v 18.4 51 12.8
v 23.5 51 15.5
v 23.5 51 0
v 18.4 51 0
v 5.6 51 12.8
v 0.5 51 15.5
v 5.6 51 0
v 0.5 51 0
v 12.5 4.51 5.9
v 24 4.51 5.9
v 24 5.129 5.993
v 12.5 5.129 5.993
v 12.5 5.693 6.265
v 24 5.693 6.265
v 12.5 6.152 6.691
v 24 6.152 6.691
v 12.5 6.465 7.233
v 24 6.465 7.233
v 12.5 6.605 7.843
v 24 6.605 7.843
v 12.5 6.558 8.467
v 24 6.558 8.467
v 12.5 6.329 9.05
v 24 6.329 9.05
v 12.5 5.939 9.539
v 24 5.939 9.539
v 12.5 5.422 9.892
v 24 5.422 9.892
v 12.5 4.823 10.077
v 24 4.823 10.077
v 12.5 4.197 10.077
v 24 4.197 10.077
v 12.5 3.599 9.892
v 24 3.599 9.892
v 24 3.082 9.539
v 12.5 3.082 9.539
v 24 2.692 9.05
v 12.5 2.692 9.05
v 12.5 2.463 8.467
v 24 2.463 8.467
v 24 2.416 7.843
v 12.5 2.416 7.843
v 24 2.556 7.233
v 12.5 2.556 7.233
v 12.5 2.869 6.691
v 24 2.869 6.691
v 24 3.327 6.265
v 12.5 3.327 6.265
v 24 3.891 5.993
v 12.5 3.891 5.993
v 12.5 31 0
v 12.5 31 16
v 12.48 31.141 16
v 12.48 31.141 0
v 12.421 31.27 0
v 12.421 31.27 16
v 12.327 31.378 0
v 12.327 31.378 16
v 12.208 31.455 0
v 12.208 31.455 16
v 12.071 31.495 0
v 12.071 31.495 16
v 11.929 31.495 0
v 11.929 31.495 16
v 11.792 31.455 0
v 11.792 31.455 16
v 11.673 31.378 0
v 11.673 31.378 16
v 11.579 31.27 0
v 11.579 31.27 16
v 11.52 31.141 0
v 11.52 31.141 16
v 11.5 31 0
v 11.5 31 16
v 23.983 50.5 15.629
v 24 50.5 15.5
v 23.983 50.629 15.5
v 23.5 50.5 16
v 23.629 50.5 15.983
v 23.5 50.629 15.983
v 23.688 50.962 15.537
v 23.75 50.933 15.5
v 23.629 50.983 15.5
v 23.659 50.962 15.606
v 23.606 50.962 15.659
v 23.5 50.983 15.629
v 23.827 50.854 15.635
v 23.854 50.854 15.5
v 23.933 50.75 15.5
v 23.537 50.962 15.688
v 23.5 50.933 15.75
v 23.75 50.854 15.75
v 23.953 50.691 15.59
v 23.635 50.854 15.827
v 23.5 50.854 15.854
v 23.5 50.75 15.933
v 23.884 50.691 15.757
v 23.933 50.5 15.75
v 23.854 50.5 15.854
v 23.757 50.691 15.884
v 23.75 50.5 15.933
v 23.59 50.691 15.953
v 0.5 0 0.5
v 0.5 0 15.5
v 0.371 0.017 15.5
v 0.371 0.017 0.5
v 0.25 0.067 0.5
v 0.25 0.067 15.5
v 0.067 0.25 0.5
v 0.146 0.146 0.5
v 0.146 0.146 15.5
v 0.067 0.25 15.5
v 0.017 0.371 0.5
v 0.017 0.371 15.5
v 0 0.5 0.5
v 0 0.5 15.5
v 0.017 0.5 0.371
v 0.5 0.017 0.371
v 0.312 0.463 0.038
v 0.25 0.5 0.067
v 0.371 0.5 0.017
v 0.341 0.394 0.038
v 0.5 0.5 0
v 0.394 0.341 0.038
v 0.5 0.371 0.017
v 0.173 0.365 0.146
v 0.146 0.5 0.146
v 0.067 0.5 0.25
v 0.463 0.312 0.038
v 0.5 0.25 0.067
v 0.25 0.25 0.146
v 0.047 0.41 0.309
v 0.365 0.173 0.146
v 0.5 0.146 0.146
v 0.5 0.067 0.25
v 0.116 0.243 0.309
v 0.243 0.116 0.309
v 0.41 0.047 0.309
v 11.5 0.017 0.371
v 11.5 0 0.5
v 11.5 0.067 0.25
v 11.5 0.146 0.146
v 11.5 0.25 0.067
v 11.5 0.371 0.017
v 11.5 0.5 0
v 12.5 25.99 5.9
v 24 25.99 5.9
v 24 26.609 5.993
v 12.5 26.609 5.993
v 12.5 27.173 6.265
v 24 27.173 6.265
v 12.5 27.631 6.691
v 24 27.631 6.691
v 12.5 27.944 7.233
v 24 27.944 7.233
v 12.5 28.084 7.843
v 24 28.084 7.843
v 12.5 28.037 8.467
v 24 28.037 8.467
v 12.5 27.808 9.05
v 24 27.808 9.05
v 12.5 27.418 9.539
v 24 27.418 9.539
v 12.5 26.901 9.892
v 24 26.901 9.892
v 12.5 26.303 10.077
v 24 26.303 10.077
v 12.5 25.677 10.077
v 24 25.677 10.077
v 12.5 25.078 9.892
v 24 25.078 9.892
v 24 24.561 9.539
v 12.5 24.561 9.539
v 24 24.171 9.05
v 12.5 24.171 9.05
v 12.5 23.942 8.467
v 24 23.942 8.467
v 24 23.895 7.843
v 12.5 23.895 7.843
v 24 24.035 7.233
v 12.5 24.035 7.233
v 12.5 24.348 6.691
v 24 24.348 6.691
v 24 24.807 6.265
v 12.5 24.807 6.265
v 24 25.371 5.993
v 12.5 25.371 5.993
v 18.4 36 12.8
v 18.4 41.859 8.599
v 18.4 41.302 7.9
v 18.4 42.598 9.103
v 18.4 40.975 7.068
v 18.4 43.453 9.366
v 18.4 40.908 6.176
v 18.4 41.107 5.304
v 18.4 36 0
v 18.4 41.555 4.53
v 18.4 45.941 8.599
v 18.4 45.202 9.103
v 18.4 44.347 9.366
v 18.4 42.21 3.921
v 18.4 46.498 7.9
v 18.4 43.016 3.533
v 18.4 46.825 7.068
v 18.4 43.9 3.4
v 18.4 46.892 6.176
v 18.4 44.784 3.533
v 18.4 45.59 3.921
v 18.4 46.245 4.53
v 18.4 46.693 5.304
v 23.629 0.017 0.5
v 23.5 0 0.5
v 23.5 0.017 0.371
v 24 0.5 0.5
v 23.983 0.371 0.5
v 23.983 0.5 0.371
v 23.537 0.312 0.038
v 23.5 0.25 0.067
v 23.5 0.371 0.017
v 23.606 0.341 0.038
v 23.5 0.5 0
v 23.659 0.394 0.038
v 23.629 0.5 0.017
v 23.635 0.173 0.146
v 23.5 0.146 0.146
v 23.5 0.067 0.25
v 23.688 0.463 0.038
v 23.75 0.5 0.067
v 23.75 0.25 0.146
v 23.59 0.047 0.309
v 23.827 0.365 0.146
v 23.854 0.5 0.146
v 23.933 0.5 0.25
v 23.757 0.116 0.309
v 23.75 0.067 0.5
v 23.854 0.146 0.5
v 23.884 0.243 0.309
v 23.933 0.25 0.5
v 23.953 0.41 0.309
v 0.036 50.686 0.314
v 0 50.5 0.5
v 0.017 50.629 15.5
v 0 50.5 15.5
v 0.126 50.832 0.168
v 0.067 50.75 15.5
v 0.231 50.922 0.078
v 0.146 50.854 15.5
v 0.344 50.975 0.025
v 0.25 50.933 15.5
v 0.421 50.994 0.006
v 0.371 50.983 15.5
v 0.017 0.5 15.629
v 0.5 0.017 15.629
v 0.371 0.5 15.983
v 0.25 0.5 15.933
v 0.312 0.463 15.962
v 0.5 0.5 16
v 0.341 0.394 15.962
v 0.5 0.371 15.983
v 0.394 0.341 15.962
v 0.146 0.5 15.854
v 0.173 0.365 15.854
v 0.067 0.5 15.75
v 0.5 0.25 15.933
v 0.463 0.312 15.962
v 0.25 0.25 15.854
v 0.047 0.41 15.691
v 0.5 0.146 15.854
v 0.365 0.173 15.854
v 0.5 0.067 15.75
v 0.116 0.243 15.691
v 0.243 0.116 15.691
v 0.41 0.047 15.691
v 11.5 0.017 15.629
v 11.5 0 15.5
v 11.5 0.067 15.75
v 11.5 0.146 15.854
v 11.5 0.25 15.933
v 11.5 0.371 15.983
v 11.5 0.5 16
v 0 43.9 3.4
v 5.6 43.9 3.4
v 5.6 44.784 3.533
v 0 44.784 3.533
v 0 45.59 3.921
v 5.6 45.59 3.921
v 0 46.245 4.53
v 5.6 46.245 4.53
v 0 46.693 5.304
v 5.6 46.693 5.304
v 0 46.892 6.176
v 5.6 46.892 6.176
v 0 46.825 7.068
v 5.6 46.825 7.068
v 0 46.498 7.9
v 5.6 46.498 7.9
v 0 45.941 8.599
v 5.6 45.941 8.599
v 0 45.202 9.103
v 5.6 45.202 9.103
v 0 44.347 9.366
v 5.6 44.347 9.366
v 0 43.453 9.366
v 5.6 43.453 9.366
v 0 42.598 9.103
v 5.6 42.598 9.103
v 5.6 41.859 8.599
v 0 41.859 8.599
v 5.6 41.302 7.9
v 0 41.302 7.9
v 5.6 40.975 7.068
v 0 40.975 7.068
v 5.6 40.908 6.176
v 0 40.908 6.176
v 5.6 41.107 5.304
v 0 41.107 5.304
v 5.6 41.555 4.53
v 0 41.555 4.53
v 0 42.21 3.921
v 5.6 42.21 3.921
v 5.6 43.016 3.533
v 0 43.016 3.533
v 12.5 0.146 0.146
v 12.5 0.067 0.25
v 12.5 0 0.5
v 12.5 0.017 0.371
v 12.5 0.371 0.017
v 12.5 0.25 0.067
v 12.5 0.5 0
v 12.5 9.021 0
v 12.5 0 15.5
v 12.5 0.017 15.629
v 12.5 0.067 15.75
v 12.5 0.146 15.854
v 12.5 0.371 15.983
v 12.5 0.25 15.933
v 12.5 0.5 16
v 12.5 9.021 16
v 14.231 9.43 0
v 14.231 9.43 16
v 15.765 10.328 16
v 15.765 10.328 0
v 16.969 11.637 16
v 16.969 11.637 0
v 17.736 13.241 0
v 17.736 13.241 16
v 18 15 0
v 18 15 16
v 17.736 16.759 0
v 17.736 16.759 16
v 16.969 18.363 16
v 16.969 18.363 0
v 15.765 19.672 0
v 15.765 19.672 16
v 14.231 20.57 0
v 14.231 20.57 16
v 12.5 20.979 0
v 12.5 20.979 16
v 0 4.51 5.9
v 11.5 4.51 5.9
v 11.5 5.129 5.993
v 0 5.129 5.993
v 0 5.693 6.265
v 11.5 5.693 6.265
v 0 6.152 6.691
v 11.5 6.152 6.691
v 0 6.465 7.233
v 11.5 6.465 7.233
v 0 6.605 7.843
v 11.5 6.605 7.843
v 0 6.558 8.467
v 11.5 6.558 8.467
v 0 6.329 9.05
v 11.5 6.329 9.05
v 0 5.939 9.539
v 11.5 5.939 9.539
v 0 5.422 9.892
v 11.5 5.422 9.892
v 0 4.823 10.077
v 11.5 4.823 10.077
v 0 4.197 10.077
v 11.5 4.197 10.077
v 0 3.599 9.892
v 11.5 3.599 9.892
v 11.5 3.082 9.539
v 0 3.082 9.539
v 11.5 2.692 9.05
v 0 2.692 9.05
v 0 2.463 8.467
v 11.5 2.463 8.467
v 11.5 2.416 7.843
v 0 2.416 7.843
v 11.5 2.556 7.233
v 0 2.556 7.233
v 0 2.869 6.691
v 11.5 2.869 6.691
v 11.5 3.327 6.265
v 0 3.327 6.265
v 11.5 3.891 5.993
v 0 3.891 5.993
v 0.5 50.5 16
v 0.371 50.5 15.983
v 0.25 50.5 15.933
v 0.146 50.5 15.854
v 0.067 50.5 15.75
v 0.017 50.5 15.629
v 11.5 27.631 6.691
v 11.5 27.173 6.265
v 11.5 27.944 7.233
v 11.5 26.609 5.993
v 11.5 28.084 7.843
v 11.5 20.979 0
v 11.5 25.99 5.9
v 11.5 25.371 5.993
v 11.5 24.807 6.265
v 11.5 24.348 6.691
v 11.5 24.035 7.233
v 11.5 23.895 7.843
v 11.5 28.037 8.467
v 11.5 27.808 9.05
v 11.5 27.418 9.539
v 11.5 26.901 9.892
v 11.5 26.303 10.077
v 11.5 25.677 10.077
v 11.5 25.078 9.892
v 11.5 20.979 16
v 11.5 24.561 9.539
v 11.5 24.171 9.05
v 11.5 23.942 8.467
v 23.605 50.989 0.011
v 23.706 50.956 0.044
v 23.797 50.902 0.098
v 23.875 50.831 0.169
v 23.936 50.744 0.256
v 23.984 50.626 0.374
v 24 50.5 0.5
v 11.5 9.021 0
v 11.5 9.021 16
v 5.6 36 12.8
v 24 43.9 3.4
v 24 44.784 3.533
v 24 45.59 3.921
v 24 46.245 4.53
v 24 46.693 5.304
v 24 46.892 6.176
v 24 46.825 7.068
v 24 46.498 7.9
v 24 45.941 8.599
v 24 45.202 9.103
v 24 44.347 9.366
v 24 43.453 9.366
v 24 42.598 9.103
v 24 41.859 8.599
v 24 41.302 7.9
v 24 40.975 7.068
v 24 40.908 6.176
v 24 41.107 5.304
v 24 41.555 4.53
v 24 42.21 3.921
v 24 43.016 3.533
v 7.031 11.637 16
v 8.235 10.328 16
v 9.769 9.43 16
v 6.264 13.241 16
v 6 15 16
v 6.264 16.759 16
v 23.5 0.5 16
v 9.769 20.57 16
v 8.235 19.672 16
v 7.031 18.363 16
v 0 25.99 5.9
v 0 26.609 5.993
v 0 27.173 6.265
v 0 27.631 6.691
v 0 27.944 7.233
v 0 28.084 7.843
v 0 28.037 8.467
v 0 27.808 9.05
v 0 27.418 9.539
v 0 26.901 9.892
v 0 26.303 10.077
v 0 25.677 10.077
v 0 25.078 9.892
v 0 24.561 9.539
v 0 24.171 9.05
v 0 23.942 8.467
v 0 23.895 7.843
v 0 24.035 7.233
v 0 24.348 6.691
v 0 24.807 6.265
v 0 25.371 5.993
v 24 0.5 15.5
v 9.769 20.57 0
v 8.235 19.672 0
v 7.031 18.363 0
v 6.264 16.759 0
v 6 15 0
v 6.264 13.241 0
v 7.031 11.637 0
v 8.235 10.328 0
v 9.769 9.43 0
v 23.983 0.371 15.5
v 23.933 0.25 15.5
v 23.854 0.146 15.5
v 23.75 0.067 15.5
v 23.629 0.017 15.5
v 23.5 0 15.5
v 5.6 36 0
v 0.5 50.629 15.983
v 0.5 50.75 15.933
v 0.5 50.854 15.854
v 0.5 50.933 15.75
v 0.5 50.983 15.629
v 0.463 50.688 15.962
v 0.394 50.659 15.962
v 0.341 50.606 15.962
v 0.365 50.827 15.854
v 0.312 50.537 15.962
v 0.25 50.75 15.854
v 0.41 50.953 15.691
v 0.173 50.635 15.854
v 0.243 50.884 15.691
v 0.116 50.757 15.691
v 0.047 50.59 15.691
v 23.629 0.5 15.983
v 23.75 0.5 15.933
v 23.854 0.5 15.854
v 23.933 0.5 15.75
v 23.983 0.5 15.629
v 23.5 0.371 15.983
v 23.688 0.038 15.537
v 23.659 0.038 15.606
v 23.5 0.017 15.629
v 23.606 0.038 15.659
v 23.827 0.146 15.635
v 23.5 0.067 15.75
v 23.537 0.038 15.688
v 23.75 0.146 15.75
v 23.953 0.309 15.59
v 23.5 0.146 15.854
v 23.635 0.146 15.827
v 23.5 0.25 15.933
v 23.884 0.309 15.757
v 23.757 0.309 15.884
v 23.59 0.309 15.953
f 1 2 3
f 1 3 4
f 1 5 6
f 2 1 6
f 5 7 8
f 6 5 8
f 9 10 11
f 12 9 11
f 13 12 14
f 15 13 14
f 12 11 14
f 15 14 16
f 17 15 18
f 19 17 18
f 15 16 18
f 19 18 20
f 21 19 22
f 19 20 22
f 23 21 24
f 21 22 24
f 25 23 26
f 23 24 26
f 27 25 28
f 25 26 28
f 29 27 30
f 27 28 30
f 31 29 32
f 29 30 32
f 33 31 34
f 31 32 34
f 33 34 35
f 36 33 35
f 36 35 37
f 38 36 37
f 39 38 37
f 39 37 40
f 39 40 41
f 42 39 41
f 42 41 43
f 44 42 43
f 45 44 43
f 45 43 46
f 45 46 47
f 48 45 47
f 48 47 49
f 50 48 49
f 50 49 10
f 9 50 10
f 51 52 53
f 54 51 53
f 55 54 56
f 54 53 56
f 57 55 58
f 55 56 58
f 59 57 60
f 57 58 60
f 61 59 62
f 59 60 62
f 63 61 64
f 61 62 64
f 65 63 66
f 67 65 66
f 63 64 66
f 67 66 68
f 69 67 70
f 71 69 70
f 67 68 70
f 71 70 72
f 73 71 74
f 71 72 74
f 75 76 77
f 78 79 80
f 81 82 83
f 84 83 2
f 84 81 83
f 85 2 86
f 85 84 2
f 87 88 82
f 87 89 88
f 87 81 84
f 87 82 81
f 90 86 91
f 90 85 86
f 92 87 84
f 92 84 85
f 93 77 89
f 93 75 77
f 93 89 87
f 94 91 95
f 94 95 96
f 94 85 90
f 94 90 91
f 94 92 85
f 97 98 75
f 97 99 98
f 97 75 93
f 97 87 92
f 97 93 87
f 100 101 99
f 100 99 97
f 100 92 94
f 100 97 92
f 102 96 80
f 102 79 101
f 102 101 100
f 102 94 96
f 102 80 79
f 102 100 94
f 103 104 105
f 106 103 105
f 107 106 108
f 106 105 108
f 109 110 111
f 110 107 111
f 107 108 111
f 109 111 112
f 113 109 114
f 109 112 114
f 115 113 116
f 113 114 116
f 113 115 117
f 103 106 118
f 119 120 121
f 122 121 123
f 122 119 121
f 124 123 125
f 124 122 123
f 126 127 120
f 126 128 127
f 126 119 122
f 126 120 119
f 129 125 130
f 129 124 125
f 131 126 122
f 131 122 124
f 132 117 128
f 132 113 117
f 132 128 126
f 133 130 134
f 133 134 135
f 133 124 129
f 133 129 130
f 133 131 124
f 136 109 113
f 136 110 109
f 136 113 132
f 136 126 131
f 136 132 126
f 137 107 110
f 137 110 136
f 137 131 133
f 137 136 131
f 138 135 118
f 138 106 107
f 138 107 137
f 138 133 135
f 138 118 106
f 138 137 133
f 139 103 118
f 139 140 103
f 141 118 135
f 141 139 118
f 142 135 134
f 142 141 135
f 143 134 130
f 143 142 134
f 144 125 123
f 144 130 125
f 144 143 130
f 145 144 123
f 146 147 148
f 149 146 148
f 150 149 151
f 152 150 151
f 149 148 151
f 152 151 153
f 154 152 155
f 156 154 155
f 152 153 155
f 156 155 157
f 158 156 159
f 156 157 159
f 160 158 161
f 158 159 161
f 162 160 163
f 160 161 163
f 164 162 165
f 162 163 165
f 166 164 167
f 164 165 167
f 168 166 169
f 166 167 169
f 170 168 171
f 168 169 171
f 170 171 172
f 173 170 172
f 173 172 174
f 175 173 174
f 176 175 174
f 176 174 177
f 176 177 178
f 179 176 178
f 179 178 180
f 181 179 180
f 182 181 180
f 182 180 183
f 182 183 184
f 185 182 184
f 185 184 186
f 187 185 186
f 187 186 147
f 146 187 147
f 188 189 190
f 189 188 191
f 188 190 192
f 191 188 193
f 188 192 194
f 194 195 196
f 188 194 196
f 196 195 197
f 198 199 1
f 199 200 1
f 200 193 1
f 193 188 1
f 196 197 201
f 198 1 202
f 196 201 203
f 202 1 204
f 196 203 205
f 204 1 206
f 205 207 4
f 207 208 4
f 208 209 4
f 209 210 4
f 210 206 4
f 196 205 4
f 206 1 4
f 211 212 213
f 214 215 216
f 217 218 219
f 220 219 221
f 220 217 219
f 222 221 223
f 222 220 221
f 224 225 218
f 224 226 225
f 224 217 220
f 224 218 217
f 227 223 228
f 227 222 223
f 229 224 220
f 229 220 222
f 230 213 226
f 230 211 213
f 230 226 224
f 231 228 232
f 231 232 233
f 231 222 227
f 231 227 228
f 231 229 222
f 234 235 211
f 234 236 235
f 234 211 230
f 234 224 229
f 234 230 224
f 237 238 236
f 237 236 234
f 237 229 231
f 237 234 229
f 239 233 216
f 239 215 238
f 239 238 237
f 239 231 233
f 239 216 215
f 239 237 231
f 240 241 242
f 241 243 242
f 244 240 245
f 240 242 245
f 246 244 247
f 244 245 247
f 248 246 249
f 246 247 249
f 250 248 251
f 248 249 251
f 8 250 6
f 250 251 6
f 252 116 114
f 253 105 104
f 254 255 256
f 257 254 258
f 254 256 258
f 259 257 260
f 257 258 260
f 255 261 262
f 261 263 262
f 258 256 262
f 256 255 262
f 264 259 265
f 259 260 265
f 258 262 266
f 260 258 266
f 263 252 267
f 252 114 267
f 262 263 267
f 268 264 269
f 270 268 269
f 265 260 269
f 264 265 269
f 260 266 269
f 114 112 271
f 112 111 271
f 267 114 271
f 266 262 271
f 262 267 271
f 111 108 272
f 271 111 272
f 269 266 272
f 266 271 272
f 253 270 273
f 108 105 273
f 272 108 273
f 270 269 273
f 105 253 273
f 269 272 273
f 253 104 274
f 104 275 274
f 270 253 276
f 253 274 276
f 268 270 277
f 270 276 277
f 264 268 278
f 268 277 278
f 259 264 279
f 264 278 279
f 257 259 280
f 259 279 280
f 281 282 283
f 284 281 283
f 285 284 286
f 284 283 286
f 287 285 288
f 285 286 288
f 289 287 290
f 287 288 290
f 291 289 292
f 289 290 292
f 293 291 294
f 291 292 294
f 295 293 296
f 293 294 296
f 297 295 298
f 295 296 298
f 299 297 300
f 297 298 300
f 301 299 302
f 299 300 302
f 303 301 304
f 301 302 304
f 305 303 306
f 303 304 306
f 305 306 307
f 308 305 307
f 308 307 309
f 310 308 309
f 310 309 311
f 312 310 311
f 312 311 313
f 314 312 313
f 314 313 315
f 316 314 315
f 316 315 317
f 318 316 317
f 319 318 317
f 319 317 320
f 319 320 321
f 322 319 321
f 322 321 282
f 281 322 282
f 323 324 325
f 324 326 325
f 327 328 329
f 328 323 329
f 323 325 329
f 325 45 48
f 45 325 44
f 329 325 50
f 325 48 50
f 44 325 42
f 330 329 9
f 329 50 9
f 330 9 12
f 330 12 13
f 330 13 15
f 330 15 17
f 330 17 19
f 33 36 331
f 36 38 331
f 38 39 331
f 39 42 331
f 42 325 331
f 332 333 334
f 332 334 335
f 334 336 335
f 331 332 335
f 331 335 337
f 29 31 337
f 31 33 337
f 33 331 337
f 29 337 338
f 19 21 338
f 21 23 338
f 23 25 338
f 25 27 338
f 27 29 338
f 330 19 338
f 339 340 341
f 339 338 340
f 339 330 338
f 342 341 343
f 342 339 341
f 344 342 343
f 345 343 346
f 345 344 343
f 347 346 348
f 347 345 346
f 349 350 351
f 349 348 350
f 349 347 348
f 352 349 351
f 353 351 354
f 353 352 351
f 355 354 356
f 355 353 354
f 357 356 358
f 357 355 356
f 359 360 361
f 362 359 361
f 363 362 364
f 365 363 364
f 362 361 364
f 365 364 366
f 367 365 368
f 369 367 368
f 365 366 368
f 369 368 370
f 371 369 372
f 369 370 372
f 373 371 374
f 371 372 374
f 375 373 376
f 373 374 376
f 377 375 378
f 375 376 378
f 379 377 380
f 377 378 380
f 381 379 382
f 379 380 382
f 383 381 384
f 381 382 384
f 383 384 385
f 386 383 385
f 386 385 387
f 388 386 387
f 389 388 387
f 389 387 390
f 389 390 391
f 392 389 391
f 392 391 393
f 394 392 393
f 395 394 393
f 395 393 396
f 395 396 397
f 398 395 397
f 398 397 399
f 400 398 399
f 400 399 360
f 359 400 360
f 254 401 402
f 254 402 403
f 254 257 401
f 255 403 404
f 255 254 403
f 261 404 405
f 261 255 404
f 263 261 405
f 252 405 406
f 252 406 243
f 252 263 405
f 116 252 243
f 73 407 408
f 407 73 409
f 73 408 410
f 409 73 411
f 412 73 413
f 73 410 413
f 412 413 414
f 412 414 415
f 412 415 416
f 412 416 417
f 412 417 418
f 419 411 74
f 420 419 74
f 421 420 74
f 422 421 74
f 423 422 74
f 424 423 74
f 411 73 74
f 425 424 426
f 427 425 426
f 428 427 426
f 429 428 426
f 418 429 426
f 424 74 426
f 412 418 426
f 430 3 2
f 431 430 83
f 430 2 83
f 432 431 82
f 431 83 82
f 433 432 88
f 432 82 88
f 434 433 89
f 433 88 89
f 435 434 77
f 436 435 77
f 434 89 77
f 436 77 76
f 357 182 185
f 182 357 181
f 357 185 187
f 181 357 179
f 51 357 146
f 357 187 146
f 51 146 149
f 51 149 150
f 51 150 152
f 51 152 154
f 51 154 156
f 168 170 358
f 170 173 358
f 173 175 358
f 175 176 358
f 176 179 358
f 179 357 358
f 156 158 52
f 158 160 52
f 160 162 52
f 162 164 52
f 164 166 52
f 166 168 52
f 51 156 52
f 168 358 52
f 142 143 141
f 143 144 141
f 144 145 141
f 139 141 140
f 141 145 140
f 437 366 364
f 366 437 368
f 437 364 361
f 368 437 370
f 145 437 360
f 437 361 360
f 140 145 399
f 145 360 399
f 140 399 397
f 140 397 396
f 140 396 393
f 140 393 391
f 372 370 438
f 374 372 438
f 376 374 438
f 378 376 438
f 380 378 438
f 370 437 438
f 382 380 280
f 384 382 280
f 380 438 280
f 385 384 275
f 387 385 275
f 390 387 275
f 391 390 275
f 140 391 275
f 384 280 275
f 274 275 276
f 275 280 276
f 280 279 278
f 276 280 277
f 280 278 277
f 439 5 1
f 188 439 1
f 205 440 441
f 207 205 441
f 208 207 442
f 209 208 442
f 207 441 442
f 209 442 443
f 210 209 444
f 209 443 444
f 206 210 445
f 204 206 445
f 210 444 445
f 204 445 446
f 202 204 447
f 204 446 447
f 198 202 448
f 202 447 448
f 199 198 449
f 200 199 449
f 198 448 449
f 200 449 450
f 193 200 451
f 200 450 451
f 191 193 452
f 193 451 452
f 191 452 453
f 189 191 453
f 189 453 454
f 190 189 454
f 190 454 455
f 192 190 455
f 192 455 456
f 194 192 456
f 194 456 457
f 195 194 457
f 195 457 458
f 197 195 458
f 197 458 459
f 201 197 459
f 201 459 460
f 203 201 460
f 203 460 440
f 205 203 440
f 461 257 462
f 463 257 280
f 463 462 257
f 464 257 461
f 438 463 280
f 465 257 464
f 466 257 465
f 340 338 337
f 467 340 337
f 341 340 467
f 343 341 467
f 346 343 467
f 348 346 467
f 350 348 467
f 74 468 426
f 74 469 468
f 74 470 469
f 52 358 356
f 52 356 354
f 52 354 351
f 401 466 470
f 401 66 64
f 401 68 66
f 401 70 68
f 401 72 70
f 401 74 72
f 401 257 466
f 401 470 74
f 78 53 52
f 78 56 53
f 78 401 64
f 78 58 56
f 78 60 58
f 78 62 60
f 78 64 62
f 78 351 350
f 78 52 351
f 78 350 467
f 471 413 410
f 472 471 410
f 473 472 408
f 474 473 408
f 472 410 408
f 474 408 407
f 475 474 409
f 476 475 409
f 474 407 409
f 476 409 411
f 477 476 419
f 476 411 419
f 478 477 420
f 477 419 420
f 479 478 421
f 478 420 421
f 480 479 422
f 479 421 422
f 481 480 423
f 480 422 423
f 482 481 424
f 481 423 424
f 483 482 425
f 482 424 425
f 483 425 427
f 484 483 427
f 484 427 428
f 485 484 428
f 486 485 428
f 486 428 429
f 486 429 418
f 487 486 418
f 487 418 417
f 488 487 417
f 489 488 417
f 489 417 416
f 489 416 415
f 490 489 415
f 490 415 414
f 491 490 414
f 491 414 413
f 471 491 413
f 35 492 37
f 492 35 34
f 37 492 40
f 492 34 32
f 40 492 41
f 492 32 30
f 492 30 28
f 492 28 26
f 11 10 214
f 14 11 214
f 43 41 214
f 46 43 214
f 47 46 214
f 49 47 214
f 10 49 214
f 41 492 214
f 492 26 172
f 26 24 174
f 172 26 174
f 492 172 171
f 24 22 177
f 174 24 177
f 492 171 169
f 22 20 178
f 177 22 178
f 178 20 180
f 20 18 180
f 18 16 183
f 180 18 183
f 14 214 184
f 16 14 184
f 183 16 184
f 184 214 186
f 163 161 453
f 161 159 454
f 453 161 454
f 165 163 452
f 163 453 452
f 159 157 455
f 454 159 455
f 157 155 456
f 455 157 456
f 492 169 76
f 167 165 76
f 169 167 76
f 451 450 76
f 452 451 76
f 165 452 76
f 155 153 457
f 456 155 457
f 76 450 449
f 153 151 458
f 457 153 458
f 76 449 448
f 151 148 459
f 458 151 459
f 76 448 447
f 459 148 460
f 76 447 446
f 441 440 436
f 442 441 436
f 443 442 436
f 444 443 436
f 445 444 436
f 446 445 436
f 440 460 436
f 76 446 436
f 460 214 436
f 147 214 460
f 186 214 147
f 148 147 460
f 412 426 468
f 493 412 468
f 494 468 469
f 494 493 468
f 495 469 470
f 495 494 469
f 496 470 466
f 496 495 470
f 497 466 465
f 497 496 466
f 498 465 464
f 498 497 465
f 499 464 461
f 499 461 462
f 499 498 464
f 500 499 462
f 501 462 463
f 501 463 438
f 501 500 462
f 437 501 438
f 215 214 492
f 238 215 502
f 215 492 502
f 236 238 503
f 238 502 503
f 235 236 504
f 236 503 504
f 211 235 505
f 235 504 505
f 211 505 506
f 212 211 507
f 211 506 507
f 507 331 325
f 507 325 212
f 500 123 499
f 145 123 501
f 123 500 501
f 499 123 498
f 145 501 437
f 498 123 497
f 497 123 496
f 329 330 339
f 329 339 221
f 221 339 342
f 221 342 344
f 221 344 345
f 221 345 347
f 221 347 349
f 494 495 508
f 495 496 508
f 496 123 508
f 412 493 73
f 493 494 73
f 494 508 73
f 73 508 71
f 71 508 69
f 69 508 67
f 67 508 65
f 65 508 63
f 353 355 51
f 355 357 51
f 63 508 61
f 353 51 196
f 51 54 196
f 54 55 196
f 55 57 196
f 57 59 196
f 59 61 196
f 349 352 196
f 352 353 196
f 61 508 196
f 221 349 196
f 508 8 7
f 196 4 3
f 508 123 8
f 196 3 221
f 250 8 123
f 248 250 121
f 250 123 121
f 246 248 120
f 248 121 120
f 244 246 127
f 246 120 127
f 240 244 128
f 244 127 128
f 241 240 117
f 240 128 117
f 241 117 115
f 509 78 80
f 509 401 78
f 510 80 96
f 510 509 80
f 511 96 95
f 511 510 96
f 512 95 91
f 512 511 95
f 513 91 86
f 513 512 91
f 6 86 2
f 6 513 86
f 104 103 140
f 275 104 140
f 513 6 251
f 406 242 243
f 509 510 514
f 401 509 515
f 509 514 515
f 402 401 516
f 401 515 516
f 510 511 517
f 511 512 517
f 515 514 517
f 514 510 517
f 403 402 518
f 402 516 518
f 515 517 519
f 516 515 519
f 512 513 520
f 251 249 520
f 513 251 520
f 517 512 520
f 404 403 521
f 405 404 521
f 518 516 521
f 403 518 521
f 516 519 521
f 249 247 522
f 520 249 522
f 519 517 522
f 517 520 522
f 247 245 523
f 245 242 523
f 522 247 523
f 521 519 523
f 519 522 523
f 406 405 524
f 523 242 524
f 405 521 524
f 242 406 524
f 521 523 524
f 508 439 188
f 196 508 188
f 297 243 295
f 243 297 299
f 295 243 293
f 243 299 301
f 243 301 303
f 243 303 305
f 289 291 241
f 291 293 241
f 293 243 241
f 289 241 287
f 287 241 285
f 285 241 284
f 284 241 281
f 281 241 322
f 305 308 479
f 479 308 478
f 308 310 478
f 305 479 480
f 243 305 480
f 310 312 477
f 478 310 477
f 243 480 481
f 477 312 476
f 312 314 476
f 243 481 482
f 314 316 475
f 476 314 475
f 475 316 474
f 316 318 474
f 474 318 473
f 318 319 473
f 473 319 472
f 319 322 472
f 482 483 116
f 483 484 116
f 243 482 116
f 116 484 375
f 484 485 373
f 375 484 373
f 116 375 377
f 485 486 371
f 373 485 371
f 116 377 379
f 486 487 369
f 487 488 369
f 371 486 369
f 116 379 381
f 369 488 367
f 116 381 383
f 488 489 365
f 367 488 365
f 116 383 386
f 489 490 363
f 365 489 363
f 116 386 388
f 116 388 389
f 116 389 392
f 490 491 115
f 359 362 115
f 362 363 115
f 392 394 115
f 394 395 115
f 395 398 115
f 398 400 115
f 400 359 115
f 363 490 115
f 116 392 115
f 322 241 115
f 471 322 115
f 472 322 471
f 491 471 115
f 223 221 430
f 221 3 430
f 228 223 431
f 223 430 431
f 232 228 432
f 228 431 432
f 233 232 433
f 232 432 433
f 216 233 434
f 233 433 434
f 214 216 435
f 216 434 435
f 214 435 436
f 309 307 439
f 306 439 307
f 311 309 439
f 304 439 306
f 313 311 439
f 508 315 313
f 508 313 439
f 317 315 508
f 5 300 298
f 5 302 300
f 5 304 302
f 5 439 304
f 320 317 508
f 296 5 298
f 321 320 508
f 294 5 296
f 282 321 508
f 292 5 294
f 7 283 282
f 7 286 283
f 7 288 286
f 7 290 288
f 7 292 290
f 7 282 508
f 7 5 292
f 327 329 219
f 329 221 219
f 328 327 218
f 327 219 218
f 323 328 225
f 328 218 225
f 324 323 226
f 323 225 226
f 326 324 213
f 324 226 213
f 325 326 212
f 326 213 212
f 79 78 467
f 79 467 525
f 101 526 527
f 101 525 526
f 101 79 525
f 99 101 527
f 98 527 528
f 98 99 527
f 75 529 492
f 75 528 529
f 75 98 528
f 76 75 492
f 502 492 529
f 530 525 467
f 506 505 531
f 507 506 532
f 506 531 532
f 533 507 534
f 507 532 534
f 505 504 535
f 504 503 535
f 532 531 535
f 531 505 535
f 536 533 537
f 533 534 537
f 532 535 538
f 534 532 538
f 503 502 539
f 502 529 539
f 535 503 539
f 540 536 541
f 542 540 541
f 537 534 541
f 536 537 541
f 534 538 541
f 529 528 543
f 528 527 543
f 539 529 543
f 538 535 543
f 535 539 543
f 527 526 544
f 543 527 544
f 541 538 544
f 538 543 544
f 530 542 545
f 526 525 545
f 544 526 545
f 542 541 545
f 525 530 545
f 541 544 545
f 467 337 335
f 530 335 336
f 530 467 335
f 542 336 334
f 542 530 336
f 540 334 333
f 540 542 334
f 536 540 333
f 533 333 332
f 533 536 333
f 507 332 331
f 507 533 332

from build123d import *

# Parameters (mm, degrees)
ESQUISSE1_R             = 6
BOSS_EXTRU_1_DEPTH      = 16
ENL_V_START             = -16
ENL_V_MAT_EXTRU_1_DEPTH = 16
ESQUISSE4_R             = 2.1
ENL_V_MAT_EXTRU_2_DEPTH = 25
ESQUISSE6_W             = 12.8
ESQUISSE6_H             = 12.8
ENL_V_MAT_EXTRU_3_DEPTH = 15
ESQUISSE7_R             = 3
ENL_V_MAT_EXTRU_5_DEPTH = 25
CONG_1_R                = 0.5


with BuildPart() as part:
    # Esquisse1 → Boss.-Extru.1 (new body)
    with BuildSketch(Plane.XY):
        Polygon((0, 0), (24, 0), (24, 24), (24, 51), (0, 51), (0, 30), align=None)
        with Locations((12, 15)):
            Circle(ESQUISSE1_R, mode=Mode.SUBTRACT)
    extrude(amount=BOSS_EXTRU_1_DEPTH)

    # Esquisse2 → Enlèv. mat.-Extru.1 (cut)
    with BuildSketch(Plane(origin=(0, 0, 0), x_dir=(-1, 0, 0), z_dir=(0, 0, -1)).offset(ENL_V_START)):
        with BuildLine():
            Line((-11.5, 31), (-11.5, -14))
            ThreePointArc((-11.5, -14), (-12, -14.5), (-12.5, -14))
            Line((-12.5, -14), (-12.5, 31))
            ThreePointArc((-12.5, 31), (-12, 31.5), (-11.5, 31))
        make_face()
    extrude(amount=ENL_V_MAT_EXTRU_1_DEPTH, mode=Mode.SUBTRACT)

    # Esquisse4 → Enlèv. mat.-Extru.2 (cut, through all)
    with BuildSketch(Plane(origin=(24, 0, 0), x_dir=(0, 0, -1), z_dir=(1, 0, 0))):
        with Locations((-8, 25.989565186)):
            Circle(ESQUISSE4_R)
        with Locations((-8, 4.510434814)):
            Circle(ESQUISSE4_R)
    extrude(amount=-ENL_V_MAT_EXTRU_2_DEPTH, mode=Mode.SUBTRACT)

    # Esquisse6 → Enlèv. mat.-Extru.3 (cut)
    with BuildSketch(Plane(origin=(0, 51, 0), x_dir=(1, 0, 0), z_dir=(0, 1, 0))):
        with Locations((12, -6.4)):
            Rectangle(ESQUISSE6_W, ESQUISSE6_H)
    extrude(amount=-ENL_V_MAT_EXTRU_3_DEPTH, mode=Mode.SUBTRACT)

    # Esquisse7 → Enlèv. mat.-Extru.5 (cut, through all)
    with BuildSketch(Plane(origin=(24, 0, 0), x_dir=(0, 0, -1), z_dir=(1, 0, 0))):
        with Locations((-6.4, 43.9)):
            Circle(ESQUISSE7_R)
    extrude(amount=-ENL_V_MAT_EXTRU_5_DEPTH, mode=Mode.SUBTRACT)

    # Congé1
    cong_1_edges = [part.edges().sort_by_distance(p)[0] for p in [
        (24, 25.5, 16),
        (0, 51, 8),
        (24, 51, 8),
        (24, 0, 8),
        (0, 0, 8),
        (12, 51, 16),
        (18.25, 0, 0),
        (18.25, 0, 16),
        (0, 25.5, 16),
        (0, 25.5, 0),
        (24, 25.5, 0),
        (5.75, 0, 16),
        (5.75, 0, 0),
    ]]
    fillet(cong_1_edges, radius=CONG_1_R)


solid = part.part
